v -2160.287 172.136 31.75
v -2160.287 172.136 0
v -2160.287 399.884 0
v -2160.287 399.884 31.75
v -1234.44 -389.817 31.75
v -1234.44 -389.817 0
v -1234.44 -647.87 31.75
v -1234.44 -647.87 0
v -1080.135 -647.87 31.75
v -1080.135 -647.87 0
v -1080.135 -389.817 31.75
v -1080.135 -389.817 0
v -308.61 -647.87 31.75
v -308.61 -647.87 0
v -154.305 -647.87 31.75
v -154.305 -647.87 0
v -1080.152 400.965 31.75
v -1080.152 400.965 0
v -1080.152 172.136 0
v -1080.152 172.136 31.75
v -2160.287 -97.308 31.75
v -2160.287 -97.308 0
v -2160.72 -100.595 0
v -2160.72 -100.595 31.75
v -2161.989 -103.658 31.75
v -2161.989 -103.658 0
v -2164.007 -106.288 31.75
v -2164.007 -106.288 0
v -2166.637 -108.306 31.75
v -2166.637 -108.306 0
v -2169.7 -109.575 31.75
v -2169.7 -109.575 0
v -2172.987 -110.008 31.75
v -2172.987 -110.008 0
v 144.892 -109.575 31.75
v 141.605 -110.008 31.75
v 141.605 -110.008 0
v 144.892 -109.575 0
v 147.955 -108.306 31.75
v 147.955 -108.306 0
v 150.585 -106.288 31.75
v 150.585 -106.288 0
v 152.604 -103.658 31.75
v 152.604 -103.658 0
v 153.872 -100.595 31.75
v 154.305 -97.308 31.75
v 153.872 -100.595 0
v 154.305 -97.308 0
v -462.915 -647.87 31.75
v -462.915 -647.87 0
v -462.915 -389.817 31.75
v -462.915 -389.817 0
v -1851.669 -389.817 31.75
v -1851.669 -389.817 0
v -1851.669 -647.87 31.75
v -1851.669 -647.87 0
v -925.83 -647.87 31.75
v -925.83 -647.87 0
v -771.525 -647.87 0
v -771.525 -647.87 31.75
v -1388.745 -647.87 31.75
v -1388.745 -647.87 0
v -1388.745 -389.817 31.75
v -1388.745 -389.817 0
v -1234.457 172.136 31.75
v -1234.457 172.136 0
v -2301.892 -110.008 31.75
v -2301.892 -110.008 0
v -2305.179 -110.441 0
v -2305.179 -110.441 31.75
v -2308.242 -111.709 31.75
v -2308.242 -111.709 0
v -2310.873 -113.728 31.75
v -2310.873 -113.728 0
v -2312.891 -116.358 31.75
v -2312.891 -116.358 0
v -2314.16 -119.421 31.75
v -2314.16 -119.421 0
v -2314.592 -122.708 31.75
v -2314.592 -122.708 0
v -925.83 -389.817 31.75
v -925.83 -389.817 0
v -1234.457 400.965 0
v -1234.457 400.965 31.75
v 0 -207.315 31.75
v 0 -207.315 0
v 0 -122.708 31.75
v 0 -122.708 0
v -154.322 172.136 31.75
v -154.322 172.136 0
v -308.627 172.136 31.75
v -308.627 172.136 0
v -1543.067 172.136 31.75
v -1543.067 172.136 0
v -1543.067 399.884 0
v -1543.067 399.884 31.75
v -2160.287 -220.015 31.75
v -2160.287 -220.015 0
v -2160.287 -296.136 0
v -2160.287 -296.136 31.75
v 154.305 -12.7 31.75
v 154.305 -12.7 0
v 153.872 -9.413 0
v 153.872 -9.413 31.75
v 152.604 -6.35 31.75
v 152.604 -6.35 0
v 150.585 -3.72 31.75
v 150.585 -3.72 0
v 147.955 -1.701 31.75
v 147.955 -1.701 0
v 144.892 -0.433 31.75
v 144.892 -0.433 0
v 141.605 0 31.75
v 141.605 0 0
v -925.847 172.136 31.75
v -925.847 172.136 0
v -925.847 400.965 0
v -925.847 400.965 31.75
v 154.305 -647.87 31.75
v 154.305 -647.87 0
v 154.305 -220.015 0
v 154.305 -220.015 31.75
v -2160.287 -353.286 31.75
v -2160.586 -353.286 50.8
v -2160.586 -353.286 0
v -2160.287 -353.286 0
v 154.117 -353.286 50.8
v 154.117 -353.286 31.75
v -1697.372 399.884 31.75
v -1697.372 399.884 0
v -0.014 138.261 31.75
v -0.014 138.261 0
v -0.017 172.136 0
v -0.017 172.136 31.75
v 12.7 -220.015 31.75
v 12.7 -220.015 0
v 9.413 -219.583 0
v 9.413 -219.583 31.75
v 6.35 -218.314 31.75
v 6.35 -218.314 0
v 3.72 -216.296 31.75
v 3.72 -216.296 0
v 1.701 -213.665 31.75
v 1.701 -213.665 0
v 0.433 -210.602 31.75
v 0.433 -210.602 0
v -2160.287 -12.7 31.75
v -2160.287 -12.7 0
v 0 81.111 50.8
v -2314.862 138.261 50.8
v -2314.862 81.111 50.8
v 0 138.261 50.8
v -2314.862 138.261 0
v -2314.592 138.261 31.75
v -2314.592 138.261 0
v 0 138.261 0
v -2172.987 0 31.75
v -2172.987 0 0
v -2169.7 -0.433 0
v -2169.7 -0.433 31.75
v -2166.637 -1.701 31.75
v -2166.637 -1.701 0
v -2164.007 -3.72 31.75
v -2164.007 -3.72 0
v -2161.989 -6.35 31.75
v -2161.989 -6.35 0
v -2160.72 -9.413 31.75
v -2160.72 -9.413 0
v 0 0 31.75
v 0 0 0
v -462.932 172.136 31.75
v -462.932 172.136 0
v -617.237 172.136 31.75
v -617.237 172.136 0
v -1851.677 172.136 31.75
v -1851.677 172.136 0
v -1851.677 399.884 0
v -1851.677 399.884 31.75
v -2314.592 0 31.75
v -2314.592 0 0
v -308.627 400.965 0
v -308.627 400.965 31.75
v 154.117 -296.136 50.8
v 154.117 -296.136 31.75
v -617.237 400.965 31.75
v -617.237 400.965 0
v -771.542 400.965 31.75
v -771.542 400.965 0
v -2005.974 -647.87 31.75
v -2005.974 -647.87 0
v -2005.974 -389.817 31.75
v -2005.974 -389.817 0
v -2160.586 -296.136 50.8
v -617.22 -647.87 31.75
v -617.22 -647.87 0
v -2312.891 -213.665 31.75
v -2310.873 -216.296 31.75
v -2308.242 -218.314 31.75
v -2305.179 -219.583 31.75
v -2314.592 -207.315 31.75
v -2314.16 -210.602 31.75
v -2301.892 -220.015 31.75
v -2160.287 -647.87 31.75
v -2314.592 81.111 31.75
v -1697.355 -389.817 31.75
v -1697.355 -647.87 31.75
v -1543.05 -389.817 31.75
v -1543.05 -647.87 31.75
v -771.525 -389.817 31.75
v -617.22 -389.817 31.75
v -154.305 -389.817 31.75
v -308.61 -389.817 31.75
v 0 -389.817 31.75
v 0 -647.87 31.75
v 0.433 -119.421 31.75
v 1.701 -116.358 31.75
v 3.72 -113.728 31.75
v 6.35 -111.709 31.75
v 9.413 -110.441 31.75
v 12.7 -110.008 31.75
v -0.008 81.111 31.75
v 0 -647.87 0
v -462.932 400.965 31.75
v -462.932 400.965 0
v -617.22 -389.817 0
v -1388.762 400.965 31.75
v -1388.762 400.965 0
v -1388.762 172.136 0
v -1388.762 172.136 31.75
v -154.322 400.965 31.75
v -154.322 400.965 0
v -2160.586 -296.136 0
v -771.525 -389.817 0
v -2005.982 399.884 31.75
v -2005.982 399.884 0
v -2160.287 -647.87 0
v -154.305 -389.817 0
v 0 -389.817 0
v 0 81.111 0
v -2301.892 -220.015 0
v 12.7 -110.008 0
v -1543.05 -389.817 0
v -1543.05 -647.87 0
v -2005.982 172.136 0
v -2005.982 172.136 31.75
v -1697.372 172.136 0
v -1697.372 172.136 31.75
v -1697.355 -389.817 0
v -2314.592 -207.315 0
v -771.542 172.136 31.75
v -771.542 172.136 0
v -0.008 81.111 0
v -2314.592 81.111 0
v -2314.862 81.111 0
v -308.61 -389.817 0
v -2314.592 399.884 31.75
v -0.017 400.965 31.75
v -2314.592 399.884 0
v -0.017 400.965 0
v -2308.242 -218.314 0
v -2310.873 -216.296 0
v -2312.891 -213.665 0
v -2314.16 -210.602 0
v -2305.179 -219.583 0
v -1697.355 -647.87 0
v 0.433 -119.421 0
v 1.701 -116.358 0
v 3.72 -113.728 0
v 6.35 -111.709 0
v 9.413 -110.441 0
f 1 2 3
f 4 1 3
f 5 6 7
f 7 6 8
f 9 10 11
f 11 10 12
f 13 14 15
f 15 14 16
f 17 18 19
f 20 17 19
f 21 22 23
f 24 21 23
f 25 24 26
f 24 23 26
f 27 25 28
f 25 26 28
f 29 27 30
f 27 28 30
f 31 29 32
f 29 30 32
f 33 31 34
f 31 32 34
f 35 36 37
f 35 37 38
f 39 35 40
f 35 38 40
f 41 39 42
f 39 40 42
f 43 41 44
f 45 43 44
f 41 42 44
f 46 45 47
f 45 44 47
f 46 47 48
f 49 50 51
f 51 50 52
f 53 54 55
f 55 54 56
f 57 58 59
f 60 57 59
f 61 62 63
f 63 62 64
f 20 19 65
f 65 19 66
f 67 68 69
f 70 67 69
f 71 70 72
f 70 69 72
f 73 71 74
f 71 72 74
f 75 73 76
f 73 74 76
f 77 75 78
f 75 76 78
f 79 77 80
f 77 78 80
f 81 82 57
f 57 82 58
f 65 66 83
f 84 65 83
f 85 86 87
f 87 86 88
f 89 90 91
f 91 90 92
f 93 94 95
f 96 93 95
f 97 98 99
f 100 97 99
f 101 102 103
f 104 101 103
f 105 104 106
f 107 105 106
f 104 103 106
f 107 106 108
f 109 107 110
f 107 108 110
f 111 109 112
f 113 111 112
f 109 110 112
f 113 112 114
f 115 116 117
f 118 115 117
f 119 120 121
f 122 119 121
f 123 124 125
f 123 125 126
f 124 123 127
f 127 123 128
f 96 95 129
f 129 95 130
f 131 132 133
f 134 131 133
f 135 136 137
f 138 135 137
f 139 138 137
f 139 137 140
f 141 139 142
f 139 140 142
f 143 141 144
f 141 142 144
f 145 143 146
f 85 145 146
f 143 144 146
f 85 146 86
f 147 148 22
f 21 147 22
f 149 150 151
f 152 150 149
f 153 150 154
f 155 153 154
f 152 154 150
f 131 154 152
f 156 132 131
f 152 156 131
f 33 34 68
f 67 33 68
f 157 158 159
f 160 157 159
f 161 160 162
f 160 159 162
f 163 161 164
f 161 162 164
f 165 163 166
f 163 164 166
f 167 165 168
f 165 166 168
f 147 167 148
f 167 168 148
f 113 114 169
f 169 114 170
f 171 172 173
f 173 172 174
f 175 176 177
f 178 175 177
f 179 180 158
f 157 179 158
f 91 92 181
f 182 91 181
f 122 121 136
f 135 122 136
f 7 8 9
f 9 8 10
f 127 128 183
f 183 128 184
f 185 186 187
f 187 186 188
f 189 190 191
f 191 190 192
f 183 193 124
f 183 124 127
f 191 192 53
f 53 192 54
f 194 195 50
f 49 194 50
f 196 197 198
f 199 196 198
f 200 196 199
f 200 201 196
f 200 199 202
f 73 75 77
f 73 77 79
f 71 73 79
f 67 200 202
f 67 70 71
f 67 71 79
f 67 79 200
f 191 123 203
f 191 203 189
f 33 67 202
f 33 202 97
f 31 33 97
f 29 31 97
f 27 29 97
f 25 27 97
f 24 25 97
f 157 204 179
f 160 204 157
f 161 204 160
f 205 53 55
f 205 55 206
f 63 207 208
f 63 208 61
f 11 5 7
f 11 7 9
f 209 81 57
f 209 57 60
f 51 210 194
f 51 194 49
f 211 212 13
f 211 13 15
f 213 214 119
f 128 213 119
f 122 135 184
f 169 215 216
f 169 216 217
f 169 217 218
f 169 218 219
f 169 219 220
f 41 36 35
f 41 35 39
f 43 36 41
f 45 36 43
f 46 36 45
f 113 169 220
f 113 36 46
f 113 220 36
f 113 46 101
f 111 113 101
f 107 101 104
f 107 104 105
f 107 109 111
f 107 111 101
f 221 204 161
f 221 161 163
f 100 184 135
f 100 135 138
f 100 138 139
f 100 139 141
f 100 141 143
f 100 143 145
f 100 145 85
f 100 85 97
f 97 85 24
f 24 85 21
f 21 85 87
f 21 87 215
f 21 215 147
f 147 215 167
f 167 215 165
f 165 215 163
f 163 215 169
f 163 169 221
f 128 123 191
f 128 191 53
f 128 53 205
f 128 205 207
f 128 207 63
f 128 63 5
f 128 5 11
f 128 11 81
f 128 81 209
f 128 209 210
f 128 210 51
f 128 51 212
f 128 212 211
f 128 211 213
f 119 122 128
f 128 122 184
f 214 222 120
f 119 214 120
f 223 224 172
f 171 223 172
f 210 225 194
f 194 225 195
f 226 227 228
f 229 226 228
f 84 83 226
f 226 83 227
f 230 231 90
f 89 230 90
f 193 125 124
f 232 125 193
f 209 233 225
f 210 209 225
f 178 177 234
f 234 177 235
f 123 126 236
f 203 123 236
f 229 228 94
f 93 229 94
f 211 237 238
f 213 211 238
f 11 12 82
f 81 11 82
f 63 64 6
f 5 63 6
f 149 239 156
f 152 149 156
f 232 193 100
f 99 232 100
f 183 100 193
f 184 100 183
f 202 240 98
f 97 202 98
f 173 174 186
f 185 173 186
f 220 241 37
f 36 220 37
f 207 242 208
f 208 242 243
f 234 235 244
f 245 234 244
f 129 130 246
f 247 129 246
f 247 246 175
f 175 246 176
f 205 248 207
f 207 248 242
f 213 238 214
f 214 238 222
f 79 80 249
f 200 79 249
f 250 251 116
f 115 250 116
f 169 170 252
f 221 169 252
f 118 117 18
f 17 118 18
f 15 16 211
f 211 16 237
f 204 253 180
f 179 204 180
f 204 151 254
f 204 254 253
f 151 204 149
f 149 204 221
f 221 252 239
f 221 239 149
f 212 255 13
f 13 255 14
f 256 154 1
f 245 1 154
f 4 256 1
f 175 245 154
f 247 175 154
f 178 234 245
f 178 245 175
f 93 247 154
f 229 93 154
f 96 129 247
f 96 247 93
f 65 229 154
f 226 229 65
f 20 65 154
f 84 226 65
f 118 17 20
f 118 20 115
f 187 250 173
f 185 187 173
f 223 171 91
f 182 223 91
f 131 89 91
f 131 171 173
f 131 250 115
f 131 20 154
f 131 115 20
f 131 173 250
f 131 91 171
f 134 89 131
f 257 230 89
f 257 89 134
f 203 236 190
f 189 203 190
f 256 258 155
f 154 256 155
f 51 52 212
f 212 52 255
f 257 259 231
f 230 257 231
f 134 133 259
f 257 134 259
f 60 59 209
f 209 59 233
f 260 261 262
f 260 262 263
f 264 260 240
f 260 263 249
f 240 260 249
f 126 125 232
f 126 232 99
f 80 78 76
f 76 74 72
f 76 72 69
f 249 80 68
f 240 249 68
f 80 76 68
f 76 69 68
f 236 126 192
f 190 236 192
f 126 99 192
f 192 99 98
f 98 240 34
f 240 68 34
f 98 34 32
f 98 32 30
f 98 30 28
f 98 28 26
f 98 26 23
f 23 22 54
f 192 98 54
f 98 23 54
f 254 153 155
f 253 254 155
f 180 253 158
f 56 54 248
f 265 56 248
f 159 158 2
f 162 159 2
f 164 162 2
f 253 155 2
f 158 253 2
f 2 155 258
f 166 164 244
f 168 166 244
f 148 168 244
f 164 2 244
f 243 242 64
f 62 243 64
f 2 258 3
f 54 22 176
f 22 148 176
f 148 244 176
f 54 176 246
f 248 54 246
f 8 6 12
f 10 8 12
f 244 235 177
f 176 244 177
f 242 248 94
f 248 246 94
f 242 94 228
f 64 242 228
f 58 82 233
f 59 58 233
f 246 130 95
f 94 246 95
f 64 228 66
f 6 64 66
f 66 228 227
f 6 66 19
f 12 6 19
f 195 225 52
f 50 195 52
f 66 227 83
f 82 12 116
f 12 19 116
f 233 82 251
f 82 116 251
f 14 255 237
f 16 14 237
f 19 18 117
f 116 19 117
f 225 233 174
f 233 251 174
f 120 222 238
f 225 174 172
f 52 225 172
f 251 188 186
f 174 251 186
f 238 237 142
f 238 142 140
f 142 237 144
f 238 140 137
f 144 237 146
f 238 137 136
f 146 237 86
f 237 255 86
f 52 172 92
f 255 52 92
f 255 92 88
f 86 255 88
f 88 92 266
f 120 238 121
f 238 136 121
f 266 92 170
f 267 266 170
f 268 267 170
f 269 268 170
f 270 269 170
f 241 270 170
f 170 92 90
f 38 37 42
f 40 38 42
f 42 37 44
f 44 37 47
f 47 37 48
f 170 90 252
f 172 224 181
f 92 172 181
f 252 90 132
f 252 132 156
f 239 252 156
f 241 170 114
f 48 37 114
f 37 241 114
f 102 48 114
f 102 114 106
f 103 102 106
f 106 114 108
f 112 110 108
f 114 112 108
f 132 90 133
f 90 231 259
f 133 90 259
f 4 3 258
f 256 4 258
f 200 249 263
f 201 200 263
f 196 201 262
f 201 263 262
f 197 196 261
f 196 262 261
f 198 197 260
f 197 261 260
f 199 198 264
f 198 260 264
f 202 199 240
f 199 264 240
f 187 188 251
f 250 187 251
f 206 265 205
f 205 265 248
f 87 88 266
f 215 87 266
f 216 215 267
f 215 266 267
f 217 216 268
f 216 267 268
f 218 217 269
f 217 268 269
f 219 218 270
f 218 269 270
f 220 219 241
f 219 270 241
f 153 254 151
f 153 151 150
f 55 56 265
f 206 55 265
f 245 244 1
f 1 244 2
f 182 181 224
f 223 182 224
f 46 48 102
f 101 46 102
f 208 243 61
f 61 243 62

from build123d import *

# Parameters (mm, degrees)
F2_DEPTH = 31.75
F1_W     = 2314.862013
F1_H     = 57.149999
F1_W_2   = 2314.703077
F1_H_2   = 57.15
F3_DEPTH = 50.8


with BuildPart() as f2:
    # F0 (on Top) → F2 (new body)
    with BuildSketch(Plane.XY):
        with BuildLine():
            Line((141.605, 0), (0, 0))
            Line((0, 0), (-0.017486, 172.135651))
            Line((-0.017486, 172.135651), (-0.017486, 400.964946))
            Line((-0.017486, 400.964946), (-154.322486, 400.964946))
            Line((-154.322486, 400.964946), (-154.322486, 172.135651))
            Line((-154.322486, 172.135651), (-308.627486, 172.135651))
            Line((-308.627486, 172.135651), (-308.627486, 400.964946))
            Line((-308.627486, 400.964946), (-462.932486, 400.964946))
            Line((-462.932486, 400.964946), (-462.932486, 172.135651))
            Line((-462.932486, 172.135651), (-617.237486, 172.135651))
            Line((-617.237486, 172.135651), (-617.237486, 400.964946))
            Line((-617.237486, 400.964946), (-771.542486, 400.964946))
            Line((-771.542486, 400.964946), (-771.542486, 172.135651))
            Line((-771.542486, 172.135651), (-925.847486, 172.135651))
            Line((-925.847486, 172.135651), (-925.847486, 400.964946))
            Line((-925.847486, 400.964946), (-1080.152486, 400.964946))
            Line((-1080.152486, 400.964946), (-1080.152486, 172.135651))
            Line((-1080.152486, 172.135651), (-1234.457486, 172.135651))
            Line((-1234.457486, 172.135651), (-1234.457486, 400.964946))
            Line((-1234.457486, 400.964946), (-1388.762486, 400.964946))
            Line((-1388.762486, 400.964946), (-1388.762486, 172.135651))
            Line((-1388.762486, 172.135651), (-1543.067486, 172.135651))
            Line((-1543.067486, 172.135651), (-1543.067486, 399.883687))
            Line((-1543.067486, 399.883687), (-1697.372486, 399.883687))
            Line((-1697.372486, 399.883687), (-1697.372486, 172.135651))
            Line((-1697.372486, 172.135651), (-1851.677486, 172.135651))
            Line((-1851.677486, 172.135651), (-1851.677486, 399.883687))
            Line((-1851.677486, 399.883687), (-2005.982486, 399.883687))
            Line((-2005.982486, 399.883687), (-2005.982486, 172.135651))
            Line((-2005.982486, 172.135651), (-2160.287486, 172.135651))
            Line((-2160.287486, 172.135651), (-2160.287486, 399.883687))
            Line((-2160.287486, 399.883687), (-2314.592486, 399.883687))
            Line((-2314.592486, 399.883687), (-2314.592486, 0))
            Line((-2314.592486, 0), (-2172.987486, 0))
            ThreePointArc((-2172.987486, 0), (-2164.00723, -3.719744), (-2160.287486, -12.7))
            Line((-2160.287486, -12.7), (-2160.287486, -97.307886))
            ThreePointArc((-2160.287486, -97.307886), (-2164.00723, -106.288142), (-2172.987486, -110.007886))
            Line((-2172.987486, -110.007886), (-2301.892486, -110.007886))
            ThreePointArc((-2301.892486, -110.007886), (-2310.872742, -113.72763), (-2314.592486, -122.707886))
            Line((-2314.592486, -122.707886), (-2314.592486, -207.315286))
            ThreePointArc((-2314.592486, -207.315286), (-2310.872742, -216.295542), (-2301.892486, -220.015286))
            Line((-2301.892486, -220.015286), (-2160.287486, -220.015286))
            Line((-2160.287486, -220.015286), (-2160.287486, -647.870064))
            Line((-2160.287486, -647.870064), (-2005.973684, -647.870064))
            Line((-2005.973684, -647.870064), (-2005.973684, -389.817446))
            Line((-2005.973684, -389.817446), (-1851.668684, -389.817446))
            Line((-1851.668684, -389.817446), (-1851.668684, -647.870064))
            Line((-1851.668684, -647.870064), (-1697.355, -647.870064))
            Line((-1697.355, -647.870064), (-1697.355, -389.817446))
            Line((-1697.355, -389.817446), (-1543.05, -389.817446))
            Line((-1543.05, -389.817446), (-1543.05, -647.870064))
            Line((-1543.05, -647.870064), (-1388.745, -647.870064))
            Line((-1388.745, -647.870064), (-1388.745, -389.817446))
            Line((-1388.745, -389.817446), (-1234.44, -389.817446))
            Line((-1234.44, -389.817446), (-1234.44, -647.870064))
            Line((-1234.44, -647.870064), (-1080.135, -647.870064))
            Line((-1080.135, -647.870064), (-1080.135, -389.817446))
            Line((-1080.135, -389.817446), (-925.83, -389.817446))
            Line((-925.83, -389.817446), (-925.83, -647.870064))
            Line((-925.83, -647.870064), (-771.525, -647.870064))
            Line((-771.525, -647.870064), (-771.525, -389.817446))
            Line((-771.525, -389.817446), (-617.22, -389.817446))
            Line((-617.22, -389.817446), (-617.22, -647.870064))
            Line((-617.22, -647.870064), (-462.915, -647.870064))
            Line((-462.915, -647.870064), (-462.915, -389.817446))
            Line((-462.915, -389.817446), (-308.61, -389.817446))
            Line((-308.61, -389.817446), (-308.61, -647.870064))
            Line((-308.61, -647.870064), (-154.305, -647.870064))
            Line((-154.305, -647.870064), (-154.305, -389.817446))
            Line((-154.305, -389.817446), (0, -389.817446))
            Line((0, -389.817446), (0, -647.870064))
            Line((0, -647.870064), (154.305, -647.870064))
            Line((154.305, -647.870064), (154.305, -220.015286))
            Line((154.305, -220.015286), (12.7, -220.015286))
            ThreePointArc((12.7, -220.015286), (3.719744, -216.295542), (0, -207.315286))
            Line((0, -207.315286), (0, -122.707886))
            ThreePointArc((0, -122.707886), (3.719744, -113.72763), (12.7, -110.007886))
            Line((12.7, -110.007886), (141.605, -110.007886))
            ThreePointArc((141.605, -110.007886), (150.585256, -106.288142), (154.305, -97.307886))
            Line((154.305, -97.307886), (154.305, -12.7))
            ThreePointArc((154.305, -12.7), (150.585256, -3.719744), (141.605, 0))
        make_face()
    extrude(amount=F2_DEPTH)

    # F1 (on face) → F3 (join)
    with BuildSketch(Plane.XY):
        with Locations((-1157.431006, 109.685767)):
            Rectangle(F1_W, F1_H)
        with Locations((-1003.234818, -324.710694)):
            Rectangle(F1_W_2, F1_H_2)
    extrude(amount=F3_DEPTH)


solid = f2.part
